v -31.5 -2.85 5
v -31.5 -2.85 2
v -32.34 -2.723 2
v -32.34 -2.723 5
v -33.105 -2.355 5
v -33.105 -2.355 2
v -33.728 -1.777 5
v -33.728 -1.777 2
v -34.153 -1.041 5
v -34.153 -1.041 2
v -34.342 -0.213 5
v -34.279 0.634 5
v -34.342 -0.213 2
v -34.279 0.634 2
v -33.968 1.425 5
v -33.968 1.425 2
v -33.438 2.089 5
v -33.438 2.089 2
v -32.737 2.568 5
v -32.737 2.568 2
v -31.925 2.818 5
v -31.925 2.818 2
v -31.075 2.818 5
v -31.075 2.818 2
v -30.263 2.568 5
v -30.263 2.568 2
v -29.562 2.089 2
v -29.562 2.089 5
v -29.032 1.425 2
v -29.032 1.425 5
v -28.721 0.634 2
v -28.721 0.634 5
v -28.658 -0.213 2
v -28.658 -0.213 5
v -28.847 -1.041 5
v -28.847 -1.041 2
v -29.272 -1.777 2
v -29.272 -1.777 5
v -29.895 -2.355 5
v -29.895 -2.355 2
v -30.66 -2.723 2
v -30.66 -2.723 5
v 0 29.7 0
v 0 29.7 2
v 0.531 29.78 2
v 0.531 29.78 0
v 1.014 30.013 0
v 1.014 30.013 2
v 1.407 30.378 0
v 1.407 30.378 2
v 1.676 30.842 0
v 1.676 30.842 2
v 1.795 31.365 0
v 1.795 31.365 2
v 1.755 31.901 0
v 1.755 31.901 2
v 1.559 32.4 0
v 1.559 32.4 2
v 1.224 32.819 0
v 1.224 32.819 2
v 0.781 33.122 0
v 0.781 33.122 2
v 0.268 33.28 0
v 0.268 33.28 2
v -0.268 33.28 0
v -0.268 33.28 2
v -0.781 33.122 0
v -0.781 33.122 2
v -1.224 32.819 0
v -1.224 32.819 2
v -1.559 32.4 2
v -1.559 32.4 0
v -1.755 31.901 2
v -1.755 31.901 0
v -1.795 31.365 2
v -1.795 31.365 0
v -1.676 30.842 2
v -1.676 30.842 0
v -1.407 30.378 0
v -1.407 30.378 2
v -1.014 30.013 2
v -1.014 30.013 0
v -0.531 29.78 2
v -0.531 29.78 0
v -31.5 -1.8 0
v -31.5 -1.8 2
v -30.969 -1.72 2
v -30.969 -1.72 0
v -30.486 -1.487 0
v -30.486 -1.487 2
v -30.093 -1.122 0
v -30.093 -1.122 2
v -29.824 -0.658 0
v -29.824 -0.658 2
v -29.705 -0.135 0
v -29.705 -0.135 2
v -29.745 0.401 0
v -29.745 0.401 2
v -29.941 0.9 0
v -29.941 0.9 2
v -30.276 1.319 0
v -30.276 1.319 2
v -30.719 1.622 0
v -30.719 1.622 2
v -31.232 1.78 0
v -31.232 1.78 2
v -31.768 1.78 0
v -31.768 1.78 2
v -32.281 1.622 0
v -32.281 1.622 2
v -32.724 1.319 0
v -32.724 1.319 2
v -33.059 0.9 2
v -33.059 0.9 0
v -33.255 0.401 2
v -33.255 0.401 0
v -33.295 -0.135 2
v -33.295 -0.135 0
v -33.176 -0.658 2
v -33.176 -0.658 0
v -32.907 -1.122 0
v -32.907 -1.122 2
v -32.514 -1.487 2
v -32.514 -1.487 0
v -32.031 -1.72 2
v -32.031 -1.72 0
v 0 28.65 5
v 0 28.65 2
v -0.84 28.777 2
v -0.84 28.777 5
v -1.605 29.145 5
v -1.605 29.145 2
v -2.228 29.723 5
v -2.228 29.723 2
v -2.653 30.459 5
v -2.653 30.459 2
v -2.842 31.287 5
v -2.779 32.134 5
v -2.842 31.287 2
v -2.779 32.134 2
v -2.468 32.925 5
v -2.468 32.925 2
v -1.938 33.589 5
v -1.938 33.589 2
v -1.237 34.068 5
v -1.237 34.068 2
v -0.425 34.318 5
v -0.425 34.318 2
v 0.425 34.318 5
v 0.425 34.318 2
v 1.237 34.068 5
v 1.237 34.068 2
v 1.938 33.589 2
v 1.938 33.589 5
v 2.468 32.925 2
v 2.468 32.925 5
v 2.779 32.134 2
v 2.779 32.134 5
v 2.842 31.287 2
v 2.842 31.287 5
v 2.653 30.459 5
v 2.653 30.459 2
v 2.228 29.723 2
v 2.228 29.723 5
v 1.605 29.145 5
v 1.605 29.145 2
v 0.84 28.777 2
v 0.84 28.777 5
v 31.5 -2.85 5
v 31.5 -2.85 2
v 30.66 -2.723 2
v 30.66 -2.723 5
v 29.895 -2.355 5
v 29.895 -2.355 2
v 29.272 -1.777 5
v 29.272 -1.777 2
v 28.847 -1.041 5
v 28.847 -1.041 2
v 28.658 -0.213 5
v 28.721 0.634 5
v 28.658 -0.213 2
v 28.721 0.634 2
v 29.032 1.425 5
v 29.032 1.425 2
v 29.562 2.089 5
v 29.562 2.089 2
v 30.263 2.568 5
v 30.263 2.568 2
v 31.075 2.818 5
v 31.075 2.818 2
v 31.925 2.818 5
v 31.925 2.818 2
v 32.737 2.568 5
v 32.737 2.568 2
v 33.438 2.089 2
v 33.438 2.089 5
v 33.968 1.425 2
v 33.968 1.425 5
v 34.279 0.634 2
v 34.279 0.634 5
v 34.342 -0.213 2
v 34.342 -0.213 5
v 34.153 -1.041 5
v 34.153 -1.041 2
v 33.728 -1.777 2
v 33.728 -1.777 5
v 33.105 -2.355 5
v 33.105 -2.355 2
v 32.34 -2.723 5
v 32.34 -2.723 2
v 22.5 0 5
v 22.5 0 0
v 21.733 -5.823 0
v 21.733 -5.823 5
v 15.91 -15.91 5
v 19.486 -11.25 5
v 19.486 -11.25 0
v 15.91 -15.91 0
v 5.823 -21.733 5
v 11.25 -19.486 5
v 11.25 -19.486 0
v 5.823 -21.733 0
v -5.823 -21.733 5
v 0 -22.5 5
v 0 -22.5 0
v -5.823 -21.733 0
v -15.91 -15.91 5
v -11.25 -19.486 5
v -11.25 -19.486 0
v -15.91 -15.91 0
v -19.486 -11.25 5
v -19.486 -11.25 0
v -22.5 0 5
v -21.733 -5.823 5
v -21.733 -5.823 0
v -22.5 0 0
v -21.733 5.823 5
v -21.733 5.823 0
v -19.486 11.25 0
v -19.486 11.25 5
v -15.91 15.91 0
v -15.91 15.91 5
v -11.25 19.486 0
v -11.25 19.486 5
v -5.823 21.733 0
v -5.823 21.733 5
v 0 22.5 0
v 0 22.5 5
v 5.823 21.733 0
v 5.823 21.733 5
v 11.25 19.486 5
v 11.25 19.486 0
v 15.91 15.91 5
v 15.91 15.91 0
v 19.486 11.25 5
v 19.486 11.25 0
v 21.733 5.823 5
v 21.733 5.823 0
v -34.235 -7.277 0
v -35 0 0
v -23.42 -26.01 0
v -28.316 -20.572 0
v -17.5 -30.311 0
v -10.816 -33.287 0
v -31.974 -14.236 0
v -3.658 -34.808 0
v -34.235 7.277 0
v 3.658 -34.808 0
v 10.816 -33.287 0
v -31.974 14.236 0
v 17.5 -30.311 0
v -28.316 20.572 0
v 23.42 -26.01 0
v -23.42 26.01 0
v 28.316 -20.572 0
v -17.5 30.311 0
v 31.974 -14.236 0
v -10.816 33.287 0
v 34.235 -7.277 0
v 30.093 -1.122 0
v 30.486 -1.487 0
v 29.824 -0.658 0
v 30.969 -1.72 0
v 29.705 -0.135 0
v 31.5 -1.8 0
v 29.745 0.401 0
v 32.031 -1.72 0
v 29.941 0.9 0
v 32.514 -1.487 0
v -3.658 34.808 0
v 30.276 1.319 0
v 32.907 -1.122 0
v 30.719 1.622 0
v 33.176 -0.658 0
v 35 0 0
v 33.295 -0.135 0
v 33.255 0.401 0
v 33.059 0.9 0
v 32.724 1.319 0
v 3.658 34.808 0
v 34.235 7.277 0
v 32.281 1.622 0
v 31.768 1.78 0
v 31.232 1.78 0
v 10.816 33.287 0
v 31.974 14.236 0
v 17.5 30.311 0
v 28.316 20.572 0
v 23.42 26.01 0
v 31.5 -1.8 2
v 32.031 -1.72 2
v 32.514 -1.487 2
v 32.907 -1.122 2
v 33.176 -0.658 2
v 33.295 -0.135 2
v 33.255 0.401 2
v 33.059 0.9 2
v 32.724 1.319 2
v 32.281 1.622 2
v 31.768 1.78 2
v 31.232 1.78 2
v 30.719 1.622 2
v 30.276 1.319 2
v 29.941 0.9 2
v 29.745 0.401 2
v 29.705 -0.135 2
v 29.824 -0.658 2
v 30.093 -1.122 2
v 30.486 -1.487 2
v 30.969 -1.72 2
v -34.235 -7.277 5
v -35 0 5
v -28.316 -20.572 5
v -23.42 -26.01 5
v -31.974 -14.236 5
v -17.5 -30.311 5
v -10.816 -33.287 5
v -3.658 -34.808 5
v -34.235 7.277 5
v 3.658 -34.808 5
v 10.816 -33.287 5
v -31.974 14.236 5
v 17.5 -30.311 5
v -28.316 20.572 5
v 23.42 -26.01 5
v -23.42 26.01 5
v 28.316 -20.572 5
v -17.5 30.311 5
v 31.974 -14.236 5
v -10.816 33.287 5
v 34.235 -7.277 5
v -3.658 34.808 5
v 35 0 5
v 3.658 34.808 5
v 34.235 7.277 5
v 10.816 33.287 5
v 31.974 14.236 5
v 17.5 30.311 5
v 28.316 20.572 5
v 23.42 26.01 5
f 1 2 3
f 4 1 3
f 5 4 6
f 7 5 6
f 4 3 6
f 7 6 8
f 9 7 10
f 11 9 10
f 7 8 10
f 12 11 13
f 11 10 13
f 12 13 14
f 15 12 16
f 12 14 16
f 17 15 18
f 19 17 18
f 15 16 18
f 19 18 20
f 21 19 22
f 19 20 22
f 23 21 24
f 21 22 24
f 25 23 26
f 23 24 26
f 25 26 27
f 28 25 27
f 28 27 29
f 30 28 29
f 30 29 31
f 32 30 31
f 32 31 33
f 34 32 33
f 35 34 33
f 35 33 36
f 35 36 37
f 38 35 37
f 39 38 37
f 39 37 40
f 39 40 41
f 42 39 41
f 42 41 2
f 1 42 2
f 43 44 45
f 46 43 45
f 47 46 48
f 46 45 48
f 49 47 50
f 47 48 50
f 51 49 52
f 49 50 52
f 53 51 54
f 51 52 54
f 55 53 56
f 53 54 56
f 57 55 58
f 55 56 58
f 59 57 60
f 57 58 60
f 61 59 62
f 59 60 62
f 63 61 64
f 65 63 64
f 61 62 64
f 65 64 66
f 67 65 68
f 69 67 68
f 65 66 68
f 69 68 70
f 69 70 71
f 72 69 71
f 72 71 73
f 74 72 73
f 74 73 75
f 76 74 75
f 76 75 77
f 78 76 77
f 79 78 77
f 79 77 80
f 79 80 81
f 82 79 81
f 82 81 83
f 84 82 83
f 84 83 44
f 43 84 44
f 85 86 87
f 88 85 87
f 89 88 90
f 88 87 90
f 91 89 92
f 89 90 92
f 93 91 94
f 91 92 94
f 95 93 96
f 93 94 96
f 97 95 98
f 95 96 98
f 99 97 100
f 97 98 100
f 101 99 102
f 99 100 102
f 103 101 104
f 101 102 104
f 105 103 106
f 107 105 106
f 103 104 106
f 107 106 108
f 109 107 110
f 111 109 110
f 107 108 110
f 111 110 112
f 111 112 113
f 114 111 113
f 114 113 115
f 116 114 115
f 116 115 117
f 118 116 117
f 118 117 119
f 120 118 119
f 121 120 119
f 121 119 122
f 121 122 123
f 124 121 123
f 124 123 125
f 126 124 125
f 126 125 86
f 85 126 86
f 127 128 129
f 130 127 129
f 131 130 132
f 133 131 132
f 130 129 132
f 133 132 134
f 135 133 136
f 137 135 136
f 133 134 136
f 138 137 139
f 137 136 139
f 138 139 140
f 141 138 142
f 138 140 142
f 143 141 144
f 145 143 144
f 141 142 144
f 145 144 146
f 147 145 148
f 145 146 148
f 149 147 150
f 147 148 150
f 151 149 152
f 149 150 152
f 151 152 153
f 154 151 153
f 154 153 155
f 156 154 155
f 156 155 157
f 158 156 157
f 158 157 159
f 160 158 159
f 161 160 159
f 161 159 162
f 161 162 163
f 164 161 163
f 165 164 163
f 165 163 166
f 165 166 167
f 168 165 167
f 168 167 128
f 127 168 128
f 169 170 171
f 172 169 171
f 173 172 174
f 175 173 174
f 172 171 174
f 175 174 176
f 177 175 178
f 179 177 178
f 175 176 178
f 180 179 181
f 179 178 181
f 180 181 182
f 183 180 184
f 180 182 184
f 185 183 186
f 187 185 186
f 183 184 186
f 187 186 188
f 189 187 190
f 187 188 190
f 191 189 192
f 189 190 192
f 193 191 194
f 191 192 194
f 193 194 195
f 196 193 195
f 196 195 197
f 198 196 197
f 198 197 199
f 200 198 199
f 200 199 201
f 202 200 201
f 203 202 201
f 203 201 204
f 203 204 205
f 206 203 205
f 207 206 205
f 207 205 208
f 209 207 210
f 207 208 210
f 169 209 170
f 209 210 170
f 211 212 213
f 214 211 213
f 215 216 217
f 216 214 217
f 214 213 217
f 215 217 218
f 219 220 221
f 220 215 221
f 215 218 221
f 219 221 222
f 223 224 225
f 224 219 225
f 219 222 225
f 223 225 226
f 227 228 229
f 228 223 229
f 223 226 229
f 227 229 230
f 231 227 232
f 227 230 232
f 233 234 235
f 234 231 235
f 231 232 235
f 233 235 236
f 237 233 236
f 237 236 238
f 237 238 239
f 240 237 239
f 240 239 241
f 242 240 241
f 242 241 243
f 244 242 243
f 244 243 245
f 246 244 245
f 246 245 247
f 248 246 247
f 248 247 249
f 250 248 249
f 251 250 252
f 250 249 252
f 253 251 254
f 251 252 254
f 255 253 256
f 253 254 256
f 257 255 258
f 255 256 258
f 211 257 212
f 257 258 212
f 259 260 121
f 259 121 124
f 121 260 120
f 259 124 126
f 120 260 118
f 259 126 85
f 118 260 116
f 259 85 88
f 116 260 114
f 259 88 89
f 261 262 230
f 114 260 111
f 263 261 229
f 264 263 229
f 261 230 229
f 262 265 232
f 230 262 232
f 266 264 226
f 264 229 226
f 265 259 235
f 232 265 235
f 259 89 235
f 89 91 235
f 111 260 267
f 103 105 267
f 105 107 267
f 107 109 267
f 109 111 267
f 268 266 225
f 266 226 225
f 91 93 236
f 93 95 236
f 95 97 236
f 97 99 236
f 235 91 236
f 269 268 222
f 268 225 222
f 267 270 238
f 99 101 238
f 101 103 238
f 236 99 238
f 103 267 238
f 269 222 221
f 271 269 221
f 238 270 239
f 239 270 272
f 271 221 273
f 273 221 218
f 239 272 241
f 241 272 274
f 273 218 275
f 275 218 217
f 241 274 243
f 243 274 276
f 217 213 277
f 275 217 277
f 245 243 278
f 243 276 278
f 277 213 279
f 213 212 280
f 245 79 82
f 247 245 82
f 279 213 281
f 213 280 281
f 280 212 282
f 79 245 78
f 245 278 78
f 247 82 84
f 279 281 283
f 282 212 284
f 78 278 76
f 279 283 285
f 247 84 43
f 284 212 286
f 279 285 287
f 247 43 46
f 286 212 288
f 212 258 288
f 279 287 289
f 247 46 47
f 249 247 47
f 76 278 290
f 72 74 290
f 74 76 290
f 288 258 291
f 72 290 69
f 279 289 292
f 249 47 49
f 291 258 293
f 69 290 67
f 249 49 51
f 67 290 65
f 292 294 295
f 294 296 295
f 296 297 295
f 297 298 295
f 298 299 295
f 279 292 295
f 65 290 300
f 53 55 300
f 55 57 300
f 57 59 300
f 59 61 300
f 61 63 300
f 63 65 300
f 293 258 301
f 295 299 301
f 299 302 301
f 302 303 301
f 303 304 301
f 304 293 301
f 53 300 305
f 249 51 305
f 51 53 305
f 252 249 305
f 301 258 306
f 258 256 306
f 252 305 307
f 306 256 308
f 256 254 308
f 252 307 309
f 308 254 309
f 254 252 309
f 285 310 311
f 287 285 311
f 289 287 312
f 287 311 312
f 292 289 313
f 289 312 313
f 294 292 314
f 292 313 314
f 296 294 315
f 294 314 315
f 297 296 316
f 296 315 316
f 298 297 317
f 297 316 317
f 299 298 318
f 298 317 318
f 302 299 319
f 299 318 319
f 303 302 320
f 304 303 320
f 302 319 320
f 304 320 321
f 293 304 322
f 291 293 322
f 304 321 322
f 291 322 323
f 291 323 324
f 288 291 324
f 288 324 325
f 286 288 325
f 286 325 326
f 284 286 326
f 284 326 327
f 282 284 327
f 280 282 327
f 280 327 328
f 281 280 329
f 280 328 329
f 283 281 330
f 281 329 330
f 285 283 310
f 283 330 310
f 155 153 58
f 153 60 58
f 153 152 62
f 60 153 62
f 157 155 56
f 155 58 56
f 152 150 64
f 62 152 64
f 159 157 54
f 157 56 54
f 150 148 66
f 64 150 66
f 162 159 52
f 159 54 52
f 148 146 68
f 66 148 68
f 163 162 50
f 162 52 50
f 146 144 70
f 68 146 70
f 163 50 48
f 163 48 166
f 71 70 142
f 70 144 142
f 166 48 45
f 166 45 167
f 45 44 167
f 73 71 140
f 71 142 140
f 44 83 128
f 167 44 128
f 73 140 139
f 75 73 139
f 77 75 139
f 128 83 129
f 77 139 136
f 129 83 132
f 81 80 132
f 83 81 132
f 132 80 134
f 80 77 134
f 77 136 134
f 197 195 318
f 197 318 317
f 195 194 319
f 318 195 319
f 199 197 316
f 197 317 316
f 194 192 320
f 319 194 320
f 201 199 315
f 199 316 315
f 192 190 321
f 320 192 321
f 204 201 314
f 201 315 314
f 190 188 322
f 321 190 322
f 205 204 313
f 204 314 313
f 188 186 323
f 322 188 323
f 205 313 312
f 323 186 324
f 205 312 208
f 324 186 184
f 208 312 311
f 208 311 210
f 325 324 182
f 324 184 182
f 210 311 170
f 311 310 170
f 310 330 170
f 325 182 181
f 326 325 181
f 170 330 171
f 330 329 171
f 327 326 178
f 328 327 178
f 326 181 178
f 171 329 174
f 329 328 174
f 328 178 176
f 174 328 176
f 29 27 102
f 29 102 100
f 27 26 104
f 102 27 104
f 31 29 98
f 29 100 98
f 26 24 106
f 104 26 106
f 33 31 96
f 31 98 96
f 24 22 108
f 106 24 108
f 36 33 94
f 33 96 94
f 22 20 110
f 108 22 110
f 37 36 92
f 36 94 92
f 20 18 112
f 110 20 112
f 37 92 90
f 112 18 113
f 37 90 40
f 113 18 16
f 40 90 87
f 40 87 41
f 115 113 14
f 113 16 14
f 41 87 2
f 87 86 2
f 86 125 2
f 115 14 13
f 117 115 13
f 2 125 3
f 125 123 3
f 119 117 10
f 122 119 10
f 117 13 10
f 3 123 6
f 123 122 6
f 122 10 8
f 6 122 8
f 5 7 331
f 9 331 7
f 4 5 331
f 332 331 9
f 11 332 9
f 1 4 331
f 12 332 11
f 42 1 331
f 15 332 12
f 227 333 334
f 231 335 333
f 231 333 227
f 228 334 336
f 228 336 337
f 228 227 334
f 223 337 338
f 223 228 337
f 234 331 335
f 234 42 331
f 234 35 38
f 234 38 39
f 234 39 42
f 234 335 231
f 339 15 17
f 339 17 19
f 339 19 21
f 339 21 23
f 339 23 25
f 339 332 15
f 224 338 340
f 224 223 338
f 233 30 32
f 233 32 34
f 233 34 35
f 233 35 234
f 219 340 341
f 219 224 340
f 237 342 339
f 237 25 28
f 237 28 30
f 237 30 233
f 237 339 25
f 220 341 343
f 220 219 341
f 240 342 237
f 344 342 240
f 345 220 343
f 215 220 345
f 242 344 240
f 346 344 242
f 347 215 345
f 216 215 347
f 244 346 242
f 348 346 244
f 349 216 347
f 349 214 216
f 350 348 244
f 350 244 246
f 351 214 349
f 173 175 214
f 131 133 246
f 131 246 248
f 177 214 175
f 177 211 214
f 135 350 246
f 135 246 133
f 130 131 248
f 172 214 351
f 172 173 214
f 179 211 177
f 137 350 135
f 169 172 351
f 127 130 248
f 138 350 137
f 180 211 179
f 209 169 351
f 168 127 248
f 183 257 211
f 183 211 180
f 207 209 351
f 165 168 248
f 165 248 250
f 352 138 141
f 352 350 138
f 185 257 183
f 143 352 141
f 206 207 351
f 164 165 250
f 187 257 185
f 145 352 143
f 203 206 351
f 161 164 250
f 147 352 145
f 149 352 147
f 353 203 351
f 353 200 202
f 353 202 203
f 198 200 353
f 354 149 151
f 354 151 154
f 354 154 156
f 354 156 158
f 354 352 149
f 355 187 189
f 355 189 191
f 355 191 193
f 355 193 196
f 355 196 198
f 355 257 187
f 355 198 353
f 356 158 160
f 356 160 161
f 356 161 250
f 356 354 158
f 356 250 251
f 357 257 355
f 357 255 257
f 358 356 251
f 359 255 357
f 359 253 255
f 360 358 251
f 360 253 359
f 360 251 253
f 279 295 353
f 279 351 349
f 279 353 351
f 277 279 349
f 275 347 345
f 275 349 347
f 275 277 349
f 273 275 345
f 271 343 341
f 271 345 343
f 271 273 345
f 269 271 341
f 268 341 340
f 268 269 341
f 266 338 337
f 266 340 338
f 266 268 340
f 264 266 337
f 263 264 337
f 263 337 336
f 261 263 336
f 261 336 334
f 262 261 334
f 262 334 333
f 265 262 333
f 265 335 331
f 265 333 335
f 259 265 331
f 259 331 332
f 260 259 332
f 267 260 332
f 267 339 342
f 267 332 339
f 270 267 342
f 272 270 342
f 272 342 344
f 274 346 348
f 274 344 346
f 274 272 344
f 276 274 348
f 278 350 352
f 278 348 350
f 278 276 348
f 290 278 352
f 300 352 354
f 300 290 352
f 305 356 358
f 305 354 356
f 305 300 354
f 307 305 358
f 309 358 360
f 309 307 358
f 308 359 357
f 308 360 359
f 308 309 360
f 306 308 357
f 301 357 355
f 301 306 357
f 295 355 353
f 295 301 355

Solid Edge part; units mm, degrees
sketch "Sketch1" plane through (0, 0, 0) normal (0, 0, 1) x (1, 0, 0)
  circle A0 centre (0, 0) radius 22.5
  circle A1 centre (0, 0) radius 35
  dimension "D1" = 70
  dimension "D2" = 45
extrude "Protrusion1" add sketch "Sketch1" along normal blind 5
hole "Hole_1" at (-31.5, 0, 5) direction (0, 0, -1) diameter 3.6 end up to next
hole "Hole1" at (0, 31.5, 5) direction (0, 0, -1) diameter 3.6 end up to next
hole "Hole2" at (31.5, 0, 5) direction (0, 0, -1) diameter 3.6 end up to next
hole "Hole_4" at (-31.5, 0, 5) direction (0, 0, -1) diameter 5.7 depth 3
hole "Hole3" at (0, 31.5, 5) direction (0, 0, -1) diameter 5.7 depth 3
hole "Hole4" at (31.5, 0, 5) direction (0, 0, -1) diameter 5.7 depth 3
